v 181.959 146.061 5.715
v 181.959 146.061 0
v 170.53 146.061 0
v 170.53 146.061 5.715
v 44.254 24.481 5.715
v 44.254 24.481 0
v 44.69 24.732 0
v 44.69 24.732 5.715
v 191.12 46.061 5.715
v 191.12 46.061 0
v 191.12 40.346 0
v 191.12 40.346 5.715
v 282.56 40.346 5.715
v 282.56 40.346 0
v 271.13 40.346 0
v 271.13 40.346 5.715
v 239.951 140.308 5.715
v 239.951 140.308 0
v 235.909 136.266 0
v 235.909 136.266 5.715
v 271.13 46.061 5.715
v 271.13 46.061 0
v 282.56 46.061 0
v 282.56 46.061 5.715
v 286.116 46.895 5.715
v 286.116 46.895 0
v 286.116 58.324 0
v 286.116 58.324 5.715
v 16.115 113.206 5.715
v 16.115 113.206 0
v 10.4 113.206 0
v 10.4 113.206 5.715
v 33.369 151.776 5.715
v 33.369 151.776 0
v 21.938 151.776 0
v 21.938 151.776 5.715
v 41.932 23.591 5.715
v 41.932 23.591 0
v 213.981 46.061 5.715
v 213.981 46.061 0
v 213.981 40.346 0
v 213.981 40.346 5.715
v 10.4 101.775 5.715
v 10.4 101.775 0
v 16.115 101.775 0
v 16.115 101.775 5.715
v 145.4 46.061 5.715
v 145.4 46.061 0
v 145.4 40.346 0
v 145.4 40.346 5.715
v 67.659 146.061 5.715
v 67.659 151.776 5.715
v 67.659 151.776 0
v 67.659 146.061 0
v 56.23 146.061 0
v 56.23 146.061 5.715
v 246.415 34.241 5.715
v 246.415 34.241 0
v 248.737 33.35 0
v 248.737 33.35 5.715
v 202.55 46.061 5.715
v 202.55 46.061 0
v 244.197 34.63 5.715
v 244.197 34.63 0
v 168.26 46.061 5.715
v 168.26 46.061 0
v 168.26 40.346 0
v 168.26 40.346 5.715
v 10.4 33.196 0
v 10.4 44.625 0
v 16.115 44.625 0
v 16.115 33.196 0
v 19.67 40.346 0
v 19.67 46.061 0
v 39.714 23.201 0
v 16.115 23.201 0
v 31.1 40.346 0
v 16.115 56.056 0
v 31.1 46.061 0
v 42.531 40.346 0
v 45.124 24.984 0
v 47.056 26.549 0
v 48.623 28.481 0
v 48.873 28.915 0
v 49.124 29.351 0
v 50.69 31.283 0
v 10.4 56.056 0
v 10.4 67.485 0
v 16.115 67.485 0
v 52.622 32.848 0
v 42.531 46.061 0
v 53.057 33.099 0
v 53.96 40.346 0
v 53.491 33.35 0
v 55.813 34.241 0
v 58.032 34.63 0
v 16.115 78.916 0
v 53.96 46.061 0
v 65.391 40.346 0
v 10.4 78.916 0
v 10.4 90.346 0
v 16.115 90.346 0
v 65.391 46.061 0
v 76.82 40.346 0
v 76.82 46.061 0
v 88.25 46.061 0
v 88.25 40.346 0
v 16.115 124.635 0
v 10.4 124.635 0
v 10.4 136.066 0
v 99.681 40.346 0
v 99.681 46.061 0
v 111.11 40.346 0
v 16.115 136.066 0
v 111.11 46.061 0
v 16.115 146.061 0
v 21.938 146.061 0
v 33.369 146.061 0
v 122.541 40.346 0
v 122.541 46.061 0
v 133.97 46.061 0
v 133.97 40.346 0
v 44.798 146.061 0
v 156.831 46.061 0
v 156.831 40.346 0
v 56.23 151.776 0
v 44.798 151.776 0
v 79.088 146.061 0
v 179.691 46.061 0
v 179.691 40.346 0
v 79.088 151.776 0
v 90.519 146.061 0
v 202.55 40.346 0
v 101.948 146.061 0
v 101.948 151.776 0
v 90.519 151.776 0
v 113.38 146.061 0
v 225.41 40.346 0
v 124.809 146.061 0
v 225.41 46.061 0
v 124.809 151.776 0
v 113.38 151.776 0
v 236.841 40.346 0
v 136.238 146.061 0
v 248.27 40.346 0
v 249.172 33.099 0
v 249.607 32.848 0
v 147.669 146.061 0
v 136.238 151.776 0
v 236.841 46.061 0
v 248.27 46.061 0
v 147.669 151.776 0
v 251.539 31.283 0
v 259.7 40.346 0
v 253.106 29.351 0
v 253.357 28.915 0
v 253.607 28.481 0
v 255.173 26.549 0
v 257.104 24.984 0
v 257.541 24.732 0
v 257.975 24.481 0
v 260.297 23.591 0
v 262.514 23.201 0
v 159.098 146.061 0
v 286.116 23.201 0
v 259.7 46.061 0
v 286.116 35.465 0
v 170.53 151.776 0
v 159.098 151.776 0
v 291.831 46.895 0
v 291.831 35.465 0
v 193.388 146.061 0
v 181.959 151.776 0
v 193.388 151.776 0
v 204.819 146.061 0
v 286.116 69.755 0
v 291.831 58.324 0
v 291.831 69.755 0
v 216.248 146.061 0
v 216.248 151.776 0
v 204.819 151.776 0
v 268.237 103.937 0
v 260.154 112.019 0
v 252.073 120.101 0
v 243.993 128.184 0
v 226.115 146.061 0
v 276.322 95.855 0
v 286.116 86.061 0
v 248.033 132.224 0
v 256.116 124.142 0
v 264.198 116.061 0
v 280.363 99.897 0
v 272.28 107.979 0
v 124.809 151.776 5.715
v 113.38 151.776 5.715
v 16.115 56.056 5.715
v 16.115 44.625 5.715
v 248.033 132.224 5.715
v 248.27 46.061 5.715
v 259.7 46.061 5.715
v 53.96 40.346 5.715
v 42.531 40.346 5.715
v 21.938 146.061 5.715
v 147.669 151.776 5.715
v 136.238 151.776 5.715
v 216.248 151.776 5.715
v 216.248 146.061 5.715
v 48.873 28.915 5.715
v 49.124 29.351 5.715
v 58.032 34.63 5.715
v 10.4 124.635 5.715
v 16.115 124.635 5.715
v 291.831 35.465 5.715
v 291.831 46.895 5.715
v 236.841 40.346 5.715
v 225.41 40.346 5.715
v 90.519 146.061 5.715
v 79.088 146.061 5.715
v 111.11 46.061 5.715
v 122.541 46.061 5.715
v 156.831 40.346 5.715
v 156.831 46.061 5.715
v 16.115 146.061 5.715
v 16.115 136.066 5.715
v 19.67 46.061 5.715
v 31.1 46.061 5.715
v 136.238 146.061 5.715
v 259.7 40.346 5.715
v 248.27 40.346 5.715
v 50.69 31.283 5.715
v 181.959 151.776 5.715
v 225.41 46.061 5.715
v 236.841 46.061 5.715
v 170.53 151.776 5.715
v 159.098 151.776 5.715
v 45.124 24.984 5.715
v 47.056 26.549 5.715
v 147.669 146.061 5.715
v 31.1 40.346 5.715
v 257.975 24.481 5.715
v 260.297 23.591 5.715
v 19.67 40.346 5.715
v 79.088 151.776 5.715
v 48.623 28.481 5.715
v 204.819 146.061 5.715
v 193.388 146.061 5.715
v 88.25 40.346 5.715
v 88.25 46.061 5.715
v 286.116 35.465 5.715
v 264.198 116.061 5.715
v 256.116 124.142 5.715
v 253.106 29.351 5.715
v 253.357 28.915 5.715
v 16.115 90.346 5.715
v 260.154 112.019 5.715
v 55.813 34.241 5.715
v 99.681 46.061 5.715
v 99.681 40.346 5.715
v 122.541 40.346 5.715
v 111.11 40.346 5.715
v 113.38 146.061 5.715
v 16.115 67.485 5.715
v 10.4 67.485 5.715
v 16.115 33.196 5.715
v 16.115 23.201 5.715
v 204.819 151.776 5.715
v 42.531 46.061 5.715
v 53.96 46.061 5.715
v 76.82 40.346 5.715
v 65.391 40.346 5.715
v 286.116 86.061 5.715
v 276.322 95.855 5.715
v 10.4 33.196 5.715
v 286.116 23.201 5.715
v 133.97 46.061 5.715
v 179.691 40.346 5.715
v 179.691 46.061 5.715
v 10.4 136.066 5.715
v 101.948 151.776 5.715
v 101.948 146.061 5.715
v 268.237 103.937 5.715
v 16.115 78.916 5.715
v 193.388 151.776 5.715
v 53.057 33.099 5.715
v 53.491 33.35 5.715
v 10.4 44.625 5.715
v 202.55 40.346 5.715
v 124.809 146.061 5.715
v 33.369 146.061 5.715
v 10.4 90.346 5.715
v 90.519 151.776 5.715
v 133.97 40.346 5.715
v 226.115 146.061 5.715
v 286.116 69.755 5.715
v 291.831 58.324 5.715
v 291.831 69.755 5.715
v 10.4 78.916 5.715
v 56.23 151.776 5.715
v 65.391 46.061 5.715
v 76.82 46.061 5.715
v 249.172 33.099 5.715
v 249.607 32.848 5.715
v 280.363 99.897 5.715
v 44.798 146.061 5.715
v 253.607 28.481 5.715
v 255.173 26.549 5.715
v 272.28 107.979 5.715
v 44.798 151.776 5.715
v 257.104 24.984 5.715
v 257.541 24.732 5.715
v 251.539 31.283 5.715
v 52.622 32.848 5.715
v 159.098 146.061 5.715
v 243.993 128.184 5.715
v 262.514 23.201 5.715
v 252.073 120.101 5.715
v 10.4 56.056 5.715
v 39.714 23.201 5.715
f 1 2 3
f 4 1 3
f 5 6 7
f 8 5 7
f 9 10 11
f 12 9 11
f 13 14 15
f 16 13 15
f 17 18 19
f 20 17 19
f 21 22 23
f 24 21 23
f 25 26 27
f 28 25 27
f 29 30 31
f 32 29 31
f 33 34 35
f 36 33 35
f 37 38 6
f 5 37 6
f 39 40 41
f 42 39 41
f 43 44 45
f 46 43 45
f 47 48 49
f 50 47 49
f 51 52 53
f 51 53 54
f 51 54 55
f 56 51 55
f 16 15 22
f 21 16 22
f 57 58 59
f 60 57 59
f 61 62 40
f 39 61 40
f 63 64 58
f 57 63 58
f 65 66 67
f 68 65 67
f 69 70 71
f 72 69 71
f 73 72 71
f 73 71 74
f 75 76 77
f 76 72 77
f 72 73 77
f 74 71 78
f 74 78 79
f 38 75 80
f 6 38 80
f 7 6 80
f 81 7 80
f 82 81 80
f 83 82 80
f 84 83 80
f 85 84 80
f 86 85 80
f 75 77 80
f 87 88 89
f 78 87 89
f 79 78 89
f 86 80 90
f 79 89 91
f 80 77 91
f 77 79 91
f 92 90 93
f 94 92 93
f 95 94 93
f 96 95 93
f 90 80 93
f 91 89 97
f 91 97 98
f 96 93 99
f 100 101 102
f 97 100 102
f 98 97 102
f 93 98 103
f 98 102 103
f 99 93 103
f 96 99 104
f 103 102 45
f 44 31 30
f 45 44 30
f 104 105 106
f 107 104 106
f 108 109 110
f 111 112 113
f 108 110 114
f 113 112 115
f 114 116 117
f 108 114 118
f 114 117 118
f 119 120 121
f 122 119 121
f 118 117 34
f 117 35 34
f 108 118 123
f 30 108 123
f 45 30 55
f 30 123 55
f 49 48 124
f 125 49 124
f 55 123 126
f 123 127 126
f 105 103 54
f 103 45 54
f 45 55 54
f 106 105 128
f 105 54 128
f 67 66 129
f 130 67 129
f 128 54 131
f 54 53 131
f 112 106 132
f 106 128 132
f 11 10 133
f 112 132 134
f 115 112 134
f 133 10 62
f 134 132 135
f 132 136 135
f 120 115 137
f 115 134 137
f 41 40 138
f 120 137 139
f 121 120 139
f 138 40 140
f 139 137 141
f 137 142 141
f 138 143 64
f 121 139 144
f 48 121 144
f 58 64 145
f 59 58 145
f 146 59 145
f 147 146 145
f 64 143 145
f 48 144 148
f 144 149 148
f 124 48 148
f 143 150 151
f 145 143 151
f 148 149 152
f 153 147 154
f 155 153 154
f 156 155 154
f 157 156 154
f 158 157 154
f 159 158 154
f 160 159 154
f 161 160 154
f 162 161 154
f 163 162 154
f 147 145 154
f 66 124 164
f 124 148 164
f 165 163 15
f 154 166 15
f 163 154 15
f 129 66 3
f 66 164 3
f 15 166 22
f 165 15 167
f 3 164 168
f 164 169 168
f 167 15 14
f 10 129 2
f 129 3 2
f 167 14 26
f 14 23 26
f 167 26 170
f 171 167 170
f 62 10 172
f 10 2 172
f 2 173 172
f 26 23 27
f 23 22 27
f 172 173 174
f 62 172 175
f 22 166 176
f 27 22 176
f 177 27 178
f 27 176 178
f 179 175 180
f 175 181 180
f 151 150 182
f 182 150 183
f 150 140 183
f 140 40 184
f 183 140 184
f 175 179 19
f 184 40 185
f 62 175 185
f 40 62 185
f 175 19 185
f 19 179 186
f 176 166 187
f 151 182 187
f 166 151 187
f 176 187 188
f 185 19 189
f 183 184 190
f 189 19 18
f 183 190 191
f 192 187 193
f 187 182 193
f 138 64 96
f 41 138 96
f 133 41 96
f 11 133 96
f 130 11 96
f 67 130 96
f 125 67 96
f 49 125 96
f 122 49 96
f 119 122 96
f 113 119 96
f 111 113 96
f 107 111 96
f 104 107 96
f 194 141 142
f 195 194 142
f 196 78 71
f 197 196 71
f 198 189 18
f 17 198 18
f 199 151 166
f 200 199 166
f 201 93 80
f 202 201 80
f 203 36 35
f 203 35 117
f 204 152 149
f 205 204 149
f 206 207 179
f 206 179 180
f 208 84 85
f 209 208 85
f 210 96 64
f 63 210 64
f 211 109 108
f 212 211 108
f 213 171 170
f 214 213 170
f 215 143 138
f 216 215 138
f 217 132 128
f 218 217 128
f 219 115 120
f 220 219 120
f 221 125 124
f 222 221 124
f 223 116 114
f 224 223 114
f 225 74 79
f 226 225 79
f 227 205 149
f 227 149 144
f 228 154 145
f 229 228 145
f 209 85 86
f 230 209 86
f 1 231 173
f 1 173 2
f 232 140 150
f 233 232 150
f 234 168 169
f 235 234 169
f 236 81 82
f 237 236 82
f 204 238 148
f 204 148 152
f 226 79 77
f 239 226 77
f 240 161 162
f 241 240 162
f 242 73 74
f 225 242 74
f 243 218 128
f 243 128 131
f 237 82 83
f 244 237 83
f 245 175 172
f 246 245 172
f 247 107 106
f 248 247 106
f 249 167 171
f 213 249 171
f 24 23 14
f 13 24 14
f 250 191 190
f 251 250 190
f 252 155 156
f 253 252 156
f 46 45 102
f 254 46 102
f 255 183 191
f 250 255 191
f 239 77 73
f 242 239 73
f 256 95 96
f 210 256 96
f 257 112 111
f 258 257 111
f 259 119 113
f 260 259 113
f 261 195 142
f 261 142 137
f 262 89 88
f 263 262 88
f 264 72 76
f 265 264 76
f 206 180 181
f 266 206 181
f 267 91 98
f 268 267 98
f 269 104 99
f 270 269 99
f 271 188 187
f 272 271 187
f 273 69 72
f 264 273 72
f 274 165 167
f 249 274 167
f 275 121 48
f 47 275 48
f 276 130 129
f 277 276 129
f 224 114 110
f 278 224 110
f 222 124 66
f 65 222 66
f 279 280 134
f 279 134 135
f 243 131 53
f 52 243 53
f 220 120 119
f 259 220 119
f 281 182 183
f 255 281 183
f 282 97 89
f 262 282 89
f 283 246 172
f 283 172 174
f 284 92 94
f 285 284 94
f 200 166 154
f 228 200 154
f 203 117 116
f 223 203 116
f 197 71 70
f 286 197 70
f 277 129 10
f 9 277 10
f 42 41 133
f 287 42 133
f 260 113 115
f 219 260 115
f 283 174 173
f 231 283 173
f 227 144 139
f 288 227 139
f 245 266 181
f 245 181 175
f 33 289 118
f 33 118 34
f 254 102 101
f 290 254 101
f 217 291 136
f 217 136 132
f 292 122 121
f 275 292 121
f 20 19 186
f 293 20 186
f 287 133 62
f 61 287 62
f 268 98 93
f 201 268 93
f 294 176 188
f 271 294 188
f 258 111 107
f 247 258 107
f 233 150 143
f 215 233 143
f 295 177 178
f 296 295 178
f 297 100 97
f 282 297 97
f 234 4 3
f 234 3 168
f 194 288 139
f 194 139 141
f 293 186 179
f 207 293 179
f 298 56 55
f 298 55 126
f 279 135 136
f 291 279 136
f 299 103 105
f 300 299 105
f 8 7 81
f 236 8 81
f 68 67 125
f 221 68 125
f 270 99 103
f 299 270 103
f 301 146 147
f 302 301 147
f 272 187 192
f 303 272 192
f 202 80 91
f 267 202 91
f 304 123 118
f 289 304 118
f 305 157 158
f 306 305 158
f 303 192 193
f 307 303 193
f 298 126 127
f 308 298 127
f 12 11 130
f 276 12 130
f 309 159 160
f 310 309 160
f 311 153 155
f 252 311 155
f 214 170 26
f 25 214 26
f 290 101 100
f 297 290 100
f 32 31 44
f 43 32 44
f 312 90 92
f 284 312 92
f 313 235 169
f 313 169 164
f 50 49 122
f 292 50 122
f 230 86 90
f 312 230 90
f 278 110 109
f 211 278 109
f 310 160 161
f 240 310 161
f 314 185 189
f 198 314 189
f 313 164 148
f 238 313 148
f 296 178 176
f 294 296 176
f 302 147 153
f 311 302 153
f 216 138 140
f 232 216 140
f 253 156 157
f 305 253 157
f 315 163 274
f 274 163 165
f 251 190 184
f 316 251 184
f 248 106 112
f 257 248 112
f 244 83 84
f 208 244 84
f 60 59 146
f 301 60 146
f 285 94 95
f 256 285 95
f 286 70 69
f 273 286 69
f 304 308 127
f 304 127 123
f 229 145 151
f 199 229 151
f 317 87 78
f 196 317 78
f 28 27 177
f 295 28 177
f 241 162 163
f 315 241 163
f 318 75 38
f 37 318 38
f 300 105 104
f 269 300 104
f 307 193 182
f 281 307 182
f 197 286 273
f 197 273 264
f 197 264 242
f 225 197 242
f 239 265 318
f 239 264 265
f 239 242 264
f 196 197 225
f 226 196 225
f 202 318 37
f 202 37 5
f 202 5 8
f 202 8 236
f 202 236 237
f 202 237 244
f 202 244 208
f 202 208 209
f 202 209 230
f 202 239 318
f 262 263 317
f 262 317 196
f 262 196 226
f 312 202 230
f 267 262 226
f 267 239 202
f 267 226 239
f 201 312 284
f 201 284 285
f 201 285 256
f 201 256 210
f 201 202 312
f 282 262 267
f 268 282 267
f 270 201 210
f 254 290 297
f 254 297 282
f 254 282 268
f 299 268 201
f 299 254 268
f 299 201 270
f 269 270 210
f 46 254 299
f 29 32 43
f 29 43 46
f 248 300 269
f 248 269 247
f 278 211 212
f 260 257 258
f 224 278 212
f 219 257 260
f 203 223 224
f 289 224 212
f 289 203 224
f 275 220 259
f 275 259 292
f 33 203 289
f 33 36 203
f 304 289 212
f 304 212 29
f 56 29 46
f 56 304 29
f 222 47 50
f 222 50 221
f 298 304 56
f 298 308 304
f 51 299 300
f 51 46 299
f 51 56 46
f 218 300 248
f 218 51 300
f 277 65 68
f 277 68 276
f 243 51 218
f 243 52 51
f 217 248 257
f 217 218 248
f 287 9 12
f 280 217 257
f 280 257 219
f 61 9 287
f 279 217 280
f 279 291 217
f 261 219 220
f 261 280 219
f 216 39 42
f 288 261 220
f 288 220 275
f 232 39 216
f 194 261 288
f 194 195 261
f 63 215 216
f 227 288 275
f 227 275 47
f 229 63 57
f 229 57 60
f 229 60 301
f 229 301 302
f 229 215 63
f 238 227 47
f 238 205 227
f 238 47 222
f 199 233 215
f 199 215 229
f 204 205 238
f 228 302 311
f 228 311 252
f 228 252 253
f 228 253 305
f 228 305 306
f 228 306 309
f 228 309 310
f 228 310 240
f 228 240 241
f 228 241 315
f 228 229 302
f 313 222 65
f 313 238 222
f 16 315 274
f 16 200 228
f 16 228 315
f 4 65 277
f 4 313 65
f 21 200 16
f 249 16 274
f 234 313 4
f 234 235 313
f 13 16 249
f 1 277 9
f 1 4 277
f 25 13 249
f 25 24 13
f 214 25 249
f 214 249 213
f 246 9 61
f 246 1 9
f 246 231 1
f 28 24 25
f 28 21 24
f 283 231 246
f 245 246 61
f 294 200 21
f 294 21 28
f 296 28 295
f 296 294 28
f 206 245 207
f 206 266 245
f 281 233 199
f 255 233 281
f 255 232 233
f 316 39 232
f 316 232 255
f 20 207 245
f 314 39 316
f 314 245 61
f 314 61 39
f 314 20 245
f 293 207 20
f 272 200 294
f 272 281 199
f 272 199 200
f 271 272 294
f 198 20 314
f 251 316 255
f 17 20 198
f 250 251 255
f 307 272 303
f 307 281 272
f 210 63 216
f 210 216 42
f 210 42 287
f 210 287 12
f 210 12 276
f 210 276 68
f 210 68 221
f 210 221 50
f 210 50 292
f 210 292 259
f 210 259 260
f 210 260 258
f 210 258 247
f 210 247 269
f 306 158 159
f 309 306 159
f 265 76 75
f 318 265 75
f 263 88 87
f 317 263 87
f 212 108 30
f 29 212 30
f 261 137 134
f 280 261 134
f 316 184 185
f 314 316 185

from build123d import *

# Parameters (mm, degrees)
BOSS_EXTRUDE1_DEPTH = 5.715


with BuildPart() as part:
    # Model → Boss-Extrude1 (new body)
    with BuildSketch(Plane.XY):
        Polygon((16.114776, 23.2006394), (38.974776, 23.2006394), (39.713662, 23.2006394), (41.932098, 23.590631), (44.254166, 24.4808502), (44.689776, 24.7316498), (45.123862, 24.983821), (47.05604, 26.54935), (48.622712, 28.481274), (48.87341, 28.91536), (49.124362, 29.350716), (50.690018, 31.282894), (52.621688, 32.848296), (53.057044, 33.098994), (53.491384, 33.349946), (55.813198, 34.241486), (58.031888, 34.630106), (58.772044, 34.630106), (243.457984, 34.630106), (244.196616, 34.630106), (246.415306, 34.241486), (248.737374, 33.349946), (249.172476, 33.098994), (249.606816, 32.848296), (251.53874, 31.282894), (253.105666, 29.350716), (253.356618, 28.91536), (253.607316, 28.481274), (255.17348, 26.54935), (257.10388, 24.983821), (257.54076, 24.7316498), (257.9751, 24.4808502), (260.29666, 23.590631), (262.51408, 23.2006394), (263.25576, 23.2006394), (286.11576, 23.2006394), (286.11576, 35.465004), (291.83076, 35.465004), (291.83076, 46.89475), (286.11576, 46.89475), (286.11576, 58.323988), (291.83076, 58.323988), (291.83076, 69.75475), (286.11576, 69.75475), (286.11576, 86.061296), (276.32152, 95.855028), (280.36266, 99.896676), (272.28038, 107.978956), (268.2367, 103.937054), (260.15442, 112.019334), (264.1981, 116.060982), (256.11582, 124.141738), (252.07341, 120.10136), (243.992654, 128.18364), (248.033032, 132.224272), (239.951006, 140.307822), (235.909104, 136.266174), (226.115372, 146.060922), (216.248488, 146.060922), (216.248488, 151.775668), (204.81925, 151.775668), (204.81925, 146.060922), (193.388488, 146.060922), (193.388488, 151.775668), (181.958996, 151.775668), (181.958996, 146.060922), (170.529504, 146.060922), (170.529504, 151.775668), (159.098488, 151.775668), (159.098488, 146.060922), (147.66925, 146.060922), (147.66925, 151.775668), (136.238488, 151.775668), (136.238488, 146.060922), (124.808996, 146.060922), (124.808996, 151.775668), (113.379504, 151.775668), (113.379504, 146.060922), (101.948488, 146.060922), (101.948488, 151.775668), (90.51925, 151.775668), (90.51925, 146.060922), (79.088488, 146.060922), (79.088488, 151.775668), (67.658996, 151.775668), (67.658996, 146.060922), (56.229504, 146.060922), (56.229504, 151.775668), (44.798488, 151.775668), (44.798488, 146.060922), (33.36925, 146.060922), (33.36925, 151.775668), (21.938361, 151.775668), (21.938361, 146.060922), (16.114776, 146.060922), (16.114776, 136.066022), (10.4000554, 136.066022), (10.4000554, 124.63526), (16.114776, 124.63526), (16.114776, 113.205768), (10.4000554, 113.205768), (10.4000554, 101.775006), (16.114776, 101.775006), (16.114776, 90.345768), (10.4000554, 90.345768), (10.4000554, 78.916022), (16.114776, 78.916022), (16.114776, 67.48526), (10.4000554, 67.48526), (10.4000554, 56.055768), (16.114776, 56.055768), (16.114776, 44.625006), (10.4000554, 44.625006), (10.4000554, 33.195514), (16.114776, 33.195514), align=None)
        Polygon((25.3848362, 40.346122), (19.6701156, 40.346122), (19.6701156, 46.060868), (31.099506, 46.060868), (31.099506, 40.346122), align=None, mode=Mode.SUBTRACT)
        Polygon((48.245268, 40.346122), (42.530522, 40.346122), (42.530522, 46.060868), (53.95976, 46.060868), (53.95976, 40.346122), align=None, mode=Mode.SUBTRACT)
        Polygon((71.105522, 40.346122), (65.390522, 40.346122), (65.390522, 46.060868), (76.820268, 46.060868), (76.820268, 40.346122), align=None, mode=Mode.SUBTRACT)
        Polygon((93.965522, 40.346122), (88.249506, 40.346122), (88.249506, 46.060868), (99.680522, 46.060868), (99.680522, 40.346122), align=None, mode=Mode.SUBTRACT)
        Polygon((116.824506, 40.346122), (111.10976, 40.346122), (111.10976, 46.060868), (122.540522, 46.060868), (122.540522, 40.346122), align=None, mode=Mode.SUBTRACT)
        Polygon((139.68476, 40.346122), (133.970268, 40.346122), (133.970268, 46.060868), (145.399506, 46.060868), (145.399506, 40.346122), align=None, mode=Mode.SUBTRACT)
        Polygon((162.545268, 40.346122), (156.830522, 40.346122), (156.830522, 46.060868), (168.25976, 46.060868), (168.25976, 40.346122), align=None, mode=Mode.SUBTRACT)
        Polygon((185.405522, 40.346122), (179.690522, 40.346122), (179.690522, 46.060868), (191.120268, 46.060868), (191.120268, 40.346122), align=None, mode=Mode.SUBTRACT)
        Polygon((208.265522, 40.346122), (202.549506, 40.346122), (202.549506, 46.060868), (213.980522, 46.060868), (213.980522, 40.346122), align=None, mode=Mode.SUBTRACT)
        Polygon((231.124506, 40.346122), (225.40976, 40.346122), (225.40976, 46.060868), (236.840522, 46.060868), (236.840522, 40.346122), align=None, mode=Mode.SUBTRACT)
        Polygon((253.98476, 40.346122), (248.270268, 40.346122), (248.270268, 46.060868), (259.69976, 46.060868), (259.69976, 40.346122), align=None, mode=Mode.SUBTRACT)
        Polygon((276.84476, 40.346122), (271.12976, 40.346122), (271.12976, 46.060868), (282.55976, 46.060868), (282.55976, 40.346122), align=None, mode=Mode.SUBTRACT)
    extrude(amount=BOSS_EXTRUDE1_DEPTH)


solid = part.part
